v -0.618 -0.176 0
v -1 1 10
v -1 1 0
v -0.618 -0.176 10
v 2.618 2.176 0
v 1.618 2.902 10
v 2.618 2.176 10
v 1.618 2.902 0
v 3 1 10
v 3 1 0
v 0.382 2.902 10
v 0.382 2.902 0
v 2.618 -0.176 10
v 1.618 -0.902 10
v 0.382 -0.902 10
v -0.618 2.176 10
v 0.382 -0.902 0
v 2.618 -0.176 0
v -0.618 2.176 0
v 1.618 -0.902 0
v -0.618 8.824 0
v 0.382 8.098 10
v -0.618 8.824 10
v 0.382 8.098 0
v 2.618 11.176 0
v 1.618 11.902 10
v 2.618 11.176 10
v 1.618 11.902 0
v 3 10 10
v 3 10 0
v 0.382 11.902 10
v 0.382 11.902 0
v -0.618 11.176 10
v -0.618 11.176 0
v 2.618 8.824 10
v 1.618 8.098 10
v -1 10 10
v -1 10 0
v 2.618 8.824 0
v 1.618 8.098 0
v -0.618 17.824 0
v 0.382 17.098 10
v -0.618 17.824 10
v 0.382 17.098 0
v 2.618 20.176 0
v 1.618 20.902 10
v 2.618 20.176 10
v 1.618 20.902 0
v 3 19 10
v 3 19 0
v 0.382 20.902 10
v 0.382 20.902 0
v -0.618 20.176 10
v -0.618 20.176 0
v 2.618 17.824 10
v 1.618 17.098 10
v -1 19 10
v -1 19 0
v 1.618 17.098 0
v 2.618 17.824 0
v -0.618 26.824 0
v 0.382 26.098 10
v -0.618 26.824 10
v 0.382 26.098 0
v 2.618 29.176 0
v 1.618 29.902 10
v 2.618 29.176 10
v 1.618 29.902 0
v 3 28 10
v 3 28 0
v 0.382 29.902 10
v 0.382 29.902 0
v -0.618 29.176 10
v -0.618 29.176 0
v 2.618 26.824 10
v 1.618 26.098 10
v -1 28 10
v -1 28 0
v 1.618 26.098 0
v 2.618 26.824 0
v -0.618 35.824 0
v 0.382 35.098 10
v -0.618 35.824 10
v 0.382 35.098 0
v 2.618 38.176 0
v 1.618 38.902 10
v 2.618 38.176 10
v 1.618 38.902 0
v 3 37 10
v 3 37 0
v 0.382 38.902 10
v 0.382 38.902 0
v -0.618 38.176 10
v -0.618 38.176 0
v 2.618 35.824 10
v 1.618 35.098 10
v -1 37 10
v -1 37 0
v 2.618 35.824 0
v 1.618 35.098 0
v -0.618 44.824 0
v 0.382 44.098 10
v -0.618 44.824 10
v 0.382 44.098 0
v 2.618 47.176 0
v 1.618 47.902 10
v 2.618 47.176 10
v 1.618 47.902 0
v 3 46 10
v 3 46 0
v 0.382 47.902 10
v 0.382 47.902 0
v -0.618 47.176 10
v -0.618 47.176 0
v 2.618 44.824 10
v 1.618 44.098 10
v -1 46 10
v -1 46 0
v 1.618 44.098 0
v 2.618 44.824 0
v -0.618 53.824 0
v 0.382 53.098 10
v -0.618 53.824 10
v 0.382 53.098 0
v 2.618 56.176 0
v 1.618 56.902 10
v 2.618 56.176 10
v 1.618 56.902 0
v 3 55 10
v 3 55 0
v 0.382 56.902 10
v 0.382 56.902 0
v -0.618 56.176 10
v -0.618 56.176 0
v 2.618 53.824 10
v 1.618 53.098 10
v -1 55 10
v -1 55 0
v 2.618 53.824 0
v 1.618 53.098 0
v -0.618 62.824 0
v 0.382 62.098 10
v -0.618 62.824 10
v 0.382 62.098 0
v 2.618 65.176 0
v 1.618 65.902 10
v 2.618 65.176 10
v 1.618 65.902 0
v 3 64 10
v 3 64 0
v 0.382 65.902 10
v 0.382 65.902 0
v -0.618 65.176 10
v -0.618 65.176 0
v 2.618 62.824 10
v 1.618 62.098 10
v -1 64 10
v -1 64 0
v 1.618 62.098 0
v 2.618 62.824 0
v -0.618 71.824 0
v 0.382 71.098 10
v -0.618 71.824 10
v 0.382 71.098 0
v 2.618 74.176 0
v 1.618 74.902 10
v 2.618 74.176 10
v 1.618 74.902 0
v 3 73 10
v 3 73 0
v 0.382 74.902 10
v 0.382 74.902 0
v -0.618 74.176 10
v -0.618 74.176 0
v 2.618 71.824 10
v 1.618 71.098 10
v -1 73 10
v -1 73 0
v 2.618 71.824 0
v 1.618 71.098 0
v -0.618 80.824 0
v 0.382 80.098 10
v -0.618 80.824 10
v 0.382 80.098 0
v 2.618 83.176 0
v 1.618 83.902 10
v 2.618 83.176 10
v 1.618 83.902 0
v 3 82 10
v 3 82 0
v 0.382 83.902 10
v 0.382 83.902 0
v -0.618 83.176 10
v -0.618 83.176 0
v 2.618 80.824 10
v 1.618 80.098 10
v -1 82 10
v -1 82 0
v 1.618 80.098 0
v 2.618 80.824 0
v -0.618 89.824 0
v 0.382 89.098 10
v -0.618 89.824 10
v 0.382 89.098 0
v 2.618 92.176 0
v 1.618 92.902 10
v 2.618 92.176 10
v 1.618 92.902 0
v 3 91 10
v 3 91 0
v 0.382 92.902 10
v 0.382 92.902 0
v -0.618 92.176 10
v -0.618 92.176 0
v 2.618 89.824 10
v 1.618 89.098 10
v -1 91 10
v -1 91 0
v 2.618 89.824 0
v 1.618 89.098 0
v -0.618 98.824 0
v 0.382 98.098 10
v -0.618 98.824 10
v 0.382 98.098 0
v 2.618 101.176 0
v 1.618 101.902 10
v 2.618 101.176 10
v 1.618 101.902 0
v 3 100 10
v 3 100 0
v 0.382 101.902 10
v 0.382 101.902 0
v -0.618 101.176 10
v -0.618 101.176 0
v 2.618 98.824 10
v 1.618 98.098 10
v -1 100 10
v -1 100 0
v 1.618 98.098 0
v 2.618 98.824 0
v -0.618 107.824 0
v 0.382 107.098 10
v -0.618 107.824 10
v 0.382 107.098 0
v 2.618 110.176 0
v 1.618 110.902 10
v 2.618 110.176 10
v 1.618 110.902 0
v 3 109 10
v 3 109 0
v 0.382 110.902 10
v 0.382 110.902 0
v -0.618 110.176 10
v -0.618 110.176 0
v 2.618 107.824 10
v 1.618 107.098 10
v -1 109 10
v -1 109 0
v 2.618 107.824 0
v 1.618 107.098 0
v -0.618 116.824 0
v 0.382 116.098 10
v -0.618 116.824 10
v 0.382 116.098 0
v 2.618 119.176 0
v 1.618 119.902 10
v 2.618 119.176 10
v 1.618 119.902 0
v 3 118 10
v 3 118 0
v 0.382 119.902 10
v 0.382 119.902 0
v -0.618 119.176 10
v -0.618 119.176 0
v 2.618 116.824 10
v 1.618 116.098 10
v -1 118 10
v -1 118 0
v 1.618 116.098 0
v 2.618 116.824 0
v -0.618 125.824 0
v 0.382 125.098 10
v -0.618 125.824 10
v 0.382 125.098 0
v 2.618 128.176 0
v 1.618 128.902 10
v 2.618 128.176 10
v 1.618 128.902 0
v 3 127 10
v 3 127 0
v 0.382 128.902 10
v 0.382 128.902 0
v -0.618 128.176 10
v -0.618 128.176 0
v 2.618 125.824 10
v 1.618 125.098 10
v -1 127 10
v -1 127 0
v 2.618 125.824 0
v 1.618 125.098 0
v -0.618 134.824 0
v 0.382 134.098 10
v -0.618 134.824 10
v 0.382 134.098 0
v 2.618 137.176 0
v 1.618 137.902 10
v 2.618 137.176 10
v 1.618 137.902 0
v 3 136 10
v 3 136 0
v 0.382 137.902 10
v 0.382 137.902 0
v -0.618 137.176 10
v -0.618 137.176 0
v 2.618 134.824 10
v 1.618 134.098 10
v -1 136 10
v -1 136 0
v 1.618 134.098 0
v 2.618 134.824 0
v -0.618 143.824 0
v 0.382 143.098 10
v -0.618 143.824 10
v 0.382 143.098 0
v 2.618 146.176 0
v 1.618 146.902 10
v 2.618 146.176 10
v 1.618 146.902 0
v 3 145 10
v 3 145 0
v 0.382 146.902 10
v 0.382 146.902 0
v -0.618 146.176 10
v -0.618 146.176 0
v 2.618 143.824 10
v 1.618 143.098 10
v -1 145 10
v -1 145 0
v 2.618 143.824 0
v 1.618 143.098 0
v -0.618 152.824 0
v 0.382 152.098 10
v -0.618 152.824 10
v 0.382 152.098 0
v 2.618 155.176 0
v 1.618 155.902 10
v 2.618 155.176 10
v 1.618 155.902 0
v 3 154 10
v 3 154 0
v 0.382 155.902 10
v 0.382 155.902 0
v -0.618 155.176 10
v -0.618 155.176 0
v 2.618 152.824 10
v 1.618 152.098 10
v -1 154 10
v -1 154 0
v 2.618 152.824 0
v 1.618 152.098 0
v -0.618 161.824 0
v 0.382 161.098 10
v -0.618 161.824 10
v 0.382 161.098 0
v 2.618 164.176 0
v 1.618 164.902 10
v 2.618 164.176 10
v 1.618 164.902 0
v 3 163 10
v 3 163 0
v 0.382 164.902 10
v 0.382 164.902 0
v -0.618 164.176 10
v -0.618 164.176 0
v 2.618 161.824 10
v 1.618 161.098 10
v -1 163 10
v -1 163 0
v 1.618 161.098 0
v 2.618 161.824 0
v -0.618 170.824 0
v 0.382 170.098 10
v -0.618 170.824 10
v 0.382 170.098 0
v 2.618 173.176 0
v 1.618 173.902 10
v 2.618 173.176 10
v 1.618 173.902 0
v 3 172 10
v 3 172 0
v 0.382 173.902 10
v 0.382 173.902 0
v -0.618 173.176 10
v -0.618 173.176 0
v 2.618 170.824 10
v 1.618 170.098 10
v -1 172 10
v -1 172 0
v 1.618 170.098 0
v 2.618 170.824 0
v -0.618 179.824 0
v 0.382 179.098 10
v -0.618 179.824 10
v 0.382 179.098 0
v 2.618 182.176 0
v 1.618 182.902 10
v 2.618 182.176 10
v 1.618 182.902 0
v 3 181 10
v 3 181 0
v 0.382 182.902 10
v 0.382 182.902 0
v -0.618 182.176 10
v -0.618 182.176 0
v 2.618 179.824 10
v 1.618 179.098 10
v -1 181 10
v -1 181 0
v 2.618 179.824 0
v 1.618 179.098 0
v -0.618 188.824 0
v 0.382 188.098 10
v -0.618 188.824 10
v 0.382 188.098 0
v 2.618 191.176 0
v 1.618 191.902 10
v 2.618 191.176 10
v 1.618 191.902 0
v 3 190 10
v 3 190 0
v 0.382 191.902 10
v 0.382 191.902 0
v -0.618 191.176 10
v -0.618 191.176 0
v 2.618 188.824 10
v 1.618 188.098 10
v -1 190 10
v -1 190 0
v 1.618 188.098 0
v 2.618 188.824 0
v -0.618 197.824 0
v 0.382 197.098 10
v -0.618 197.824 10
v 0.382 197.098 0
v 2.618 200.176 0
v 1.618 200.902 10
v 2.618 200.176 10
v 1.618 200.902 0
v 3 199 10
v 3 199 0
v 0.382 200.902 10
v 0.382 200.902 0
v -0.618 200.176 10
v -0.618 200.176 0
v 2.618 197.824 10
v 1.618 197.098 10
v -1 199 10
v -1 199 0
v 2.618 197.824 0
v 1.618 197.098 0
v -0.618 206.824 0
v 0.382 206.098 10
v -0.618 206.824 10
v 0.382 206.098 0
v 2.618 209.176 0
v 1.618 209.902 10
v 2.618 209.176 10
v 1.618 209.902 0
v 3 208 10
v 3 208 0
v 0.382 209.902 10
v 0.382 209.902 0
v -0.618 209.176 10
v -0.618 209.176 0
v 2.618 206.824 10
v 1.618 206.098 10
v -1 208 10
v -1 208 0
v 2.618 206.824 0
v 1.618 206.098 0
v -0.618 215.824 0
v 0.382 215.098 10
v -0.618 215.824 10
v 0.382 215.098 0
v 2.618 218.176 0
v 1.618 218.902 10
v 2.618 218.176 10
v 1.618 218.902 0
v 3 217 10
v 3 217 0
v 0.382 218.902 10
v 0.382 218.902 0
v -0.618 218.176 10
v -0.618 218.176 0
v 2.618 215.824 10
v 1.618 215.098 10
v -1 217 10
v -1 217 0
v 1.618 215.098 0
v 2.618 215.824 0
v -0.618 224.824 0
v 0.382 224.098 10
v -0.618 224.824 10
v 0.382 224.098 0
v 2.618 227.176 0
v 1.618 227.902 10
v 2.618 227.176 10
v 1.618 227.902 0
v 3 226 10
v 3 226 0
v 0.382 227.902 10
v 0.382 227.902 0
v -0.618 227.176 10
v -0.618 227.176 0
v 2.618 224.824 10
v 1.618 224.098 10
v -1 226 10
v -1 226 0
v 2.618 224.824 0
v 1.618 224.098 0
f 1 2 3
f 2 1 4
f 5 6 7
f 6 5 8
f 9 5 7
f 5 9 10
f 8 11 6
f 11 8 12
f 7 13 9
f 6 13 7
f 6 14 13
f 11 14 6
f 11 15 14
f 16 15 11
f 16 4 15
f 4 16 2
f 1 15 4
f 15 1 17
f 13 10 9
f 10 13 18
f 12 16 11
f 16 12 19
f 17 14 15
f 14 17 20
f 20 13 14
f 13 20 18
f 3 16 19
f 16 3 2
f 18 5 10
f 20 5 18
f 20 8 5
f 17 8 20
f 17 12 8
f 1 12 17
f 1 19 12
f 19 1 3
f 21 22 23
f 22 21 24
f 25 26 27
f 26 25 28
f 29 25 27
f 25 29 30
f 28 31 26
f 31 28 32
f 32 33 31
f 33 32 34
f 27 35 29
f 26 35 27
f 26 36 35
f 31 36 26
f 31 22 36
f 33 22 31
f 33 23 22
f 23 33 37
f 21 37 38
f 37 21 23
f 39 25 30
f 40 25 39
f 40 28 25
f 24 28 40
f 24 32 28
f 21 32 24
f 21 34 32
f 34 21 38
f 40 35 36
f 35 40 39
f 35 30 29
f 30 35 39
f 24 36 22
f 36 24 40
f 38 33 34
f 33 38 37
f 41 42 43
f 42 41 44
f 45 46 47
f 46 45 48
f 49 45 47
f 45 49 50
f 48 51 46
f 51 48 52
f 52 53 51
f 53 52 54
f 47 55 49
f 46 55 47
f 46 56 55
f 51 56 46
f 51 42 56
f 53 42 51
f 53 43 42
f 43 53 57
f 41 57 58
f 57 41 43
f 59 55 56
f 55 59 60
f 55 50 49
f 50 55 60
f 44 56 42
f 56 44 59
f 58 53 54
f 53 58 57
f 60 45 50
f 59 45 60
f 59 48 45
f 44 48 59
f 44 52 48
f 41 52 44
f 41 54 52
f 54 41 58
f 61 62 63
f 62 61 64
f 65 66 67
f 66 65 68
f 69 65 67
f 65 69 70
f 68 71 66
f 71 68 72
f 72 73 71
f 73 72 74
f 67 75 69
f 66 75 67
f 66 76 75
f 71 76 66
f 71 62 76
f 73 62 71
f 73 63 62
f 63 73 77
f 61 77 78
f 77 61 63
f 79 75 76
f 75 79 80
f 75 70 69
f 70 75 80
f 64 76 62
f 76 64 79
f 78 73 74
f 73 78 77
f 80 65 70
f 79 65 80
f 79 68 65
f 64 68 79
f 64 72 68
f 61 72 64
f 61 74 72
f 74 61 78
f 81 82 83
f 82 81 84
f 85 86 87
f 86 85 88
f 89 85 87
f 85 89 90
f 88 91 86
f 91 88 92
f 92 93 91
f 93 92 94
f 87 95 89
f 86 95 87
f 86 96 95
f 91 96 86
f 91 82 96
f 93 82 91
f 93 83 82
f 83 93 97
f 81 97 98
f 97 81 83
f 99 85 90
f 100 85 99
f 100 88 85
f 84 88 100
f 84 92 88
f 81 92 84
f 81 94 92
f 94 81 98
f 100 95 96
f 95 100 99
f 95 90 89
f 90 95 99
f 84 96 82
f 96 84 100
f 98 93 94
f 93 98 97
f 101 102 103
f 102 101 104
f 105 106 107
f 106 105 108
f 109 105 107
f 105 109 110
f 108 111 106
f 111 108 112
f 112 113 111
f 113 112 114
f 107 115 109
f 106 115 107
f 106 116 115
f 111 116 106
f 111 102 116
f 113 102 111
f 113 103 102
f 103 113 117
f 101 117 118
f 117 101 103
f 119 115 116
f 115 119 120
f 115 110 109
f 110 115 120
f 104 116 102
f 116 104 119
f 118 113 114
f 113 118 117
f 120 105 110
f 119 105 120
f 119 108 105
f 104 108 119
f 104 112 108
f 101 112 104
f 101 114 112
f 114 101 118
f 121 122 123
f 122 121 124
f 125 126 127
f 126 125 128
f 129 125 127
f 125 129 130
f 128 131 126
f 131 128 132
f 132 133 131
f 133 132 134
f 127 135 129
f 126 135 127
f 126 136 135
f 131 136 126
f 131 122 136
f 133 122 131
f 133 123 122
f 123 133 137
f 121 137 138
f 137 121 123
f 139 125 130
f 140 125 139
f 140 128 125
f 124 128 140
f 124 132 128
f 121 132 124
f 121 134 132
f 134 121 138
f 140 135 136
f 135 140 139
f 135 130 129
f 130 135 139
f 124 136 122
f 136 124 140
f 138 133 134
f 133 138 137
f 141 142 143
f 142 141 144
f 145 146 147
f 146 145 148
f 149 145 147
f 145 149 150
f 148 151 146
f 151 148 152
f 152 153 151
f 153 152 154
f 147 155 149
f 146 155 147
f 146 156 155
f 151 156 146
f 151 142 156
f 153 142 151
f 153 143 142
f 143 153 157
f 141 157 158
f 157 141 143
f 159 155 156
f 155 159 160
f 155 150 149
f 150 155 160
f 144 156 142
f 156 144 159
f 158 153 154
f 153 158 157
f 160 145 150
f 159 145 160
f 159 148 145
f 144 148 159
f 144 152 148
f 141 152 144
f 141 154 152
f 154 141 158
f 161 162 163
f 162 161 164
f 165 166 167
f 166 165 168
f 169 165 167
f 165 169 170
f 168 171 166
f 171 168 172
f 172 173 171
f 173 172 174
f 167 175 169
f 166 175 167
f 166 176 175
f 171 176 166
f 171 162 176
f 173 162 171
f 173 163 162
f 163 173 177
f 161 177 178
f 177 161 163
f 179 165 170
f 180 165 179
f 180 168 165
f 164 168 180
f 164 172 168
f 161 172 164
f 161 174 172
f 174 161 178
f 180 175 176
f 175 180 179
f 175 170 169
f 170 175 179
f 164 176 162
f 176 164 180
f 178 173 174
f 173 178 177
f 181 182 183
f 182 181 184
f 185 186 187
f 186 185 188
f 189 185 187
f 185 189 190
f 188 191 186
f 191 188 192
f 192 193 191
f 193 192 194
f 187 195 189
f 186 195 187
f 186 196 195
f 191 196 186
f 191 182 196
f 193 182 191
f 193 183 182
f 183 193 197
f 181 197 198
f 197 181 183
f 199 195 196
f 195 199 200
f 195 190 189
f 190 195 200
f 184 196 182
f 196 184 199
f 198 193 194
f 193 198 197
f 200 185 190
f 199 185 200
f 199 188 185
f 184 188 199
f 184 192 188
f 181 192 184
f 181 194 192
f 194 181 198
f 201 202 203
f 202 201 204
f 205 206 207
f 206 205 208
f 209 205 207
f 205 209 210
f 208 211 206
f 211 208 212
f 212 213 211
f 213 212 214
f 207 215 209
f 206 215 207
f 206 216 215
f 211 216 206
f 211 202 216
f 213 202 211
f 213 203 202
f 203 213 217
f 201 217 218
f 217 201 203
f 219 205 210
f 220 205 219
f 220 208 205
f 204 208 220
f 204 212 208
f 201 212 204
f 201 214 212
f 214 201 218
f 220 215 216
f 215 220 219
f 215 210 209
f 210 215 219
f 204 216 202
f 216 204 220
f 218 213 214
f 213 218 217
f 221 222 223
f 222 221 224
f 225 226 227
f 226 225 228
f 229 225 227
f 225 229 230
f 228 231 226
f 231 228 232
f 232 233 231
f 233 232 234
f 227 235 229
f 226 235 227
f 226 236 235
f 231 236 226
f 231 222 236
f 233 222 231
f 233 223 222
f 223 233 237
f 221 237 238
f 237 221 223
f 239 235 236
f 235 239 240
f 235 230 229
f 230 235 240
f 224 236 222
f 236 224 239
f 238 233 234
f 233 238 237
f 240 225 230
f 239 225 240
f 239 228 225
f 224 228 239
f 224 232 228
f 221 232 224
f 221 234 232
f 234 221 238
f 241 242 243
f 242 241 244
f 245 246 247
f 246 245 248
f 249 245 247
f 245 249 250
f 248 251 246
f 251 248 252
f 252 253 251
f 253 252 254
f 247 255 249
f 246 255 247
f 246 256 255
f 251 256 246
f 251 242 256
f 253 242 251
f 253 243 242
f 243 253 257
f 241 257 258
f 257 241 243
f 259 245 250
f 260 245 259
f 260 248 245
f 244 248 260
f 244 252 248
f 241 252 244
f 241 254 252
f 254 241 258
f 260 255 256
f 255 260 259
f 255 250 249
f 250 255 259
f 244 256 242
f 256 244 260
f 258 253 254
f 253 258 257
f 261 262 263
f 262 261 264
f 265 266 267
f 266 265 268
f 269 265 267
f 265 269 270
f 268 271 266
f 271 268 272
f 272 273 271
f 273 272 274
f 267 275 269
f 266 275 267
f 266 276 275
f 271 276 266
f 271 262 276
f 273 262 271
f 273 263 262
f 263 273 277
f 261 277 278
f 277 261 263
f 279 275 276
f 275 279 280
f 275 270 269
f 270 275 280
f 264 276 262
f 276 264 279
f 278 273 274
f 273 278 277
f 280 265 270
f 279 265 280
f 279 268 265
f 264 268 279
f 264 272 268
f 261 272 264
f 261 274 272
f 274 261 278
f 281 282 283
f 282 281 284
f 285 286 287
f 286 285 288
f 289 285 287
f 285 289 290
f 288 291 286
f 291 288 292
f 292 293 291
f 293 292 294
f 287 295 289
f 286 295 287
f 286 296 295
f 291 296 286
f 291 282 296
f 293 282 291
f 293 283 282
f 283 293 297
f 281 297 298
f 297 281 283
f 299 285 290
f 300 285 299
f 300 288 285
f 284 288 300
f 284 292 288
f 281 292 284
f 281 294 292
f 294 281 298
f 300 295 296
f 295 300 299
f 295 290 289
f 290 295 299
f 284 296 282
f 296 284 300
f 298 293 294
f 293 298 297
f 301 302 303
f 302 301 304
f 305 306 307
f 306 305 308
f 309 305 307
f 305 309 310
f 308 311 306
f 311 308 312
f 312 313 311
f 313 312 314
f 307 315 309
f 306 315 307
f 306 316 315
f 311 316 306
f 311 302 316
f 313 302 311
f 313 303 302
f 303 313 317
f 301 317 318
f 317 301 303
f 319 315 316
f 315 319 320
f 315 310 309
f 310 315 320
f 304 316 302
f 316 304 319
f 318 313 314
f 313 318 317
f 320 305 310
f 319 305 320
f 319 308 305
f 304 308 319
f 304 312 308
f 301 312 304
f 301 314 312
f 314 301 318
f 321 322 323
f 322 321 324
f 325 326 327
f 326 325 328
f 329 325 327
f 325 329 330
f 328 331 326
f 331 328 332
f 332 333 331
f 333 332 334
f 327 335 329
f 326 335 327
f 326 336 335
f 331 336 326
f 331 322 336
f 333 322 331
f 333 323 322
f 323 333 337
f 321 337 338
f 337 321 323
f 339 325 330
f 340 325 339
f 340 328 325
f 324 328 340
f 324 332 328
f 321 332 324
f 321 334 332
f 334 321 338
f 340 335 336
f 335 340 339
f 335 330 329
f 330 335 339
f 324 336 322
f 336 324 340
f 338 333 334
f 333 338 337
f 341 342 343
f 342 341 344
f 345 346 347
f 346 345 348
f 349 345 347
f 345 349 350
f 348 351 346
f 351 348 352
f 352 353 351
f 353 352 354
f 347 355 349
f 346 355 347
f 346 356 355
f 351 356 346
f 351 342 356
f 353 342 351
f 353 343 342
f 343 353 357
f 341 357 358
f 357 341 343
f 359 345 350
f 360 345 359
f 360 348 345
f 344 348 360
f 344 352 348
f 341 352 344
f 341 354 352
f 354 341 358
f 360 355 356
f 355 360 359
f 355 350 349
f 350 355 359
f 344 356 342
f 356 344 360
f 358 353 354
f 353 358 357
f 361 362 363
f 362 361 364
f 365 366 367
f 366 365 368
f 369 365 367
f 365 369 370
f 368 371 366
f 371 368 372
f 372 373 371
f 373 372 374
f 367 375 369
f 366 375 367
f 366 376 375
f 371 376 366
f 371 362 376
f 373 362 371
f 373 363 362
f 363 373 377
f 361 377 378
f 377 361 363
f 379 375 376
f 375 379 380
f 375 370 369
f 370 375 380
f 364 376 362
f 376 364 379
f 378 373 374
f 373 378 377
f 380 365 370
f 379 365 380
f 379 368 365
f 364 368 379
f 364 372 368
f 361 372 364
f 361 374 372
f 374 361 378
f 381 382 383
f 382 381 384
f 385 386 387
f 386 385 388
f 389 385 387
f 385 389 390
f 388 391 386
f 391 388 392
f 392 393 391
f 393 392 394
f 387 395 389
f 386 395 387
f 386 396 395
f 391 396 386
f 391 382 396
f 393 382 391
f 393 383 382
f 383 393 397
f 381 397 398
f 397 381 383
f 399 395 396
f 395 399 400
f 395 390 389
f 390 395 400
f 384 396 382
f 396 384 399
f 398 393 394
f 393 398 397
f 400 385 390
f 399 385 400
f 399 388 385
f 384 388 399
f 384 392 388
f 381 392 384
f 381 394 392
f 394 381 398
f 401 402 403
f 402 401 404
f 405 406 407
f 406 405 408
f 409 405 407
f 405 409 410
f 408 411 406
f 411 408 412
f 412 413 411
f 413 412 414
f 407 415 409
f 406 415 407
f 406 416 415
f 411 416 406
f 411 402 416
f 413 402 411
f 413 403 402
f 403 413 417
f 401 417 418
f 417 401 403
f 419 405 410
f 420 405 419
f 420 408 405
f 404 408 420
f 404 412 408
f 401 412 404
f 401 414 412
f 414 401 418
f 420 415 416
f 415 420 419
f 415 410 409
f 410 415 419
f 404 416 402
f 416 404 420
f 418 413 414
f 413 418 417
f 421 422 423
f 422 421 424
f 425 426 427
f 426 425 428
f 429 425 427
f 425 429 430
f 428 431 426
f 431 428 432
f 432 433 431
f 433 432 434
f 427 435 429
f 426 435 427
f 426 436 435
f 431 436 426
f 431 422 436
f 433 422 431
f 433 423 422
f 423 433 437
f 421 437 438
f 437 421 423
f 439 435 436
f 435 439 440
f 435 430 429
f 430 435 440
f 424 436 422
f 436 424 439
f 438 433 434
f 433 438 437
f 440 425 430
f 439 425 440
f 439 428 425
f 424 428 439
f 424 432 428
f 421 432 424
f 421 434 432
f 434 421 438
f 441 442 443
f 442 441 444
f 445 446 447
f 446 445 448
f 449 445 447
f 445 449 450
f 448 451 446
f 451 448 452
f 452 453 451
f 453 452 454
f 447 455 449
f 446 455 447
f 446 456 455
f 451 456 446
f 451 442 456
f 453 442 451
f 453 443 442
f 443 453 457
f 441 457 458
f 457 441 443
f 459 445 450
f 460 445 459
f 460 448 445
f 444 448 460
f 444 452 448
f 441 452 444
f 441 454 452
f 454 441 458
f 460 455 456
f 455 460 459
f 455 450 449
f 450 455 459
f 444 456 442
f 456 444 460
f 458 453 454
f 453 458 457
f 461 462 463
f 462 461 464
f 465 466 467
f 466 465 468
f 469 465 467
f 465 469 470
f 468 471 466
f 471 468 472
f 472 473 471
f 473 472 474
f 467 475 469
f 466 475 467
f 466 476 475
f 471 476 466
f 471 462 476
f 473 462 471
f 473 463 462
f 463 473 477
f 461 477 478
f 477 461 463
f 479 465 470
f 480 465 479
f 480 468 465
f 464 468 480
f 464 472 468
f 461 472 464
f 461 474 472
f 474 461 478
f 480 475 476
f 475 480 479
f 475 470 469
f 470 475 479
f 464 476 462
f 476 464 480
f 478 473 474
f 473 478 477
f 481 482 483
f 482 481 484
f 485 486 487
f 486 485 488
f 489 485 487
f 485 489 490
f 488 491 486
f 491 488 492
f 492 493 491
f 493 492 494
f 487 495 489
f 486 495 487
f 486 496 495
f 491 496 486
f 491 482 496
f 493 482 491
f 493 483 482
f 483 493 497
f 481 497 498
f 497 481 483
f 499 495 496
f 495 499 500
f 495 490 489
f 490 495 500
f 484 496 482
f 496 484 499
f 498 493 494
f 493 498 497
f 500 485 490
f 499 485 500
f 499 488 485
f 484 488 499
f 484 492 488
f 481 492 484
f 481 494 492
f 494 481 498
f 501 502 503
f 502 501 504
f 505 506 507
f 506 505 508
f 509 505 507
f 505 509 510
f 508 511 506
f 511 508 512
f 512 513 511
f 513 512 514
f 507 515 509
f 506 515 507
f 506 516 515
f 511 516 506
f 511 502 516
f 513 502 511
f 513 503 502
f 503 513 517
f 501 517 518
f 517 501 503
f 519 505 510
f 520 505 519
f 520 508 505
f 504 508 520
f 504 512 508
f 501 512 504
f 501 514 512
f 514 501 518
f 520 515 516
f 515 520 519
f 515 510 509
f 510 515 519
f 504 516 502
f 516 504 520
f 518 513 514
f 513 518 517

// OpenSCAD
grid(1, 26, 9)
	cylinder(r = 2, h = 10, $fn = 10);

module grid(x, y, space)
{
	for (i = [1:space:x * space]) {
		for (j = [1:space:y * space]) {
			translate([i, j, 0]) {
				child();
			}
		}
	}
}
